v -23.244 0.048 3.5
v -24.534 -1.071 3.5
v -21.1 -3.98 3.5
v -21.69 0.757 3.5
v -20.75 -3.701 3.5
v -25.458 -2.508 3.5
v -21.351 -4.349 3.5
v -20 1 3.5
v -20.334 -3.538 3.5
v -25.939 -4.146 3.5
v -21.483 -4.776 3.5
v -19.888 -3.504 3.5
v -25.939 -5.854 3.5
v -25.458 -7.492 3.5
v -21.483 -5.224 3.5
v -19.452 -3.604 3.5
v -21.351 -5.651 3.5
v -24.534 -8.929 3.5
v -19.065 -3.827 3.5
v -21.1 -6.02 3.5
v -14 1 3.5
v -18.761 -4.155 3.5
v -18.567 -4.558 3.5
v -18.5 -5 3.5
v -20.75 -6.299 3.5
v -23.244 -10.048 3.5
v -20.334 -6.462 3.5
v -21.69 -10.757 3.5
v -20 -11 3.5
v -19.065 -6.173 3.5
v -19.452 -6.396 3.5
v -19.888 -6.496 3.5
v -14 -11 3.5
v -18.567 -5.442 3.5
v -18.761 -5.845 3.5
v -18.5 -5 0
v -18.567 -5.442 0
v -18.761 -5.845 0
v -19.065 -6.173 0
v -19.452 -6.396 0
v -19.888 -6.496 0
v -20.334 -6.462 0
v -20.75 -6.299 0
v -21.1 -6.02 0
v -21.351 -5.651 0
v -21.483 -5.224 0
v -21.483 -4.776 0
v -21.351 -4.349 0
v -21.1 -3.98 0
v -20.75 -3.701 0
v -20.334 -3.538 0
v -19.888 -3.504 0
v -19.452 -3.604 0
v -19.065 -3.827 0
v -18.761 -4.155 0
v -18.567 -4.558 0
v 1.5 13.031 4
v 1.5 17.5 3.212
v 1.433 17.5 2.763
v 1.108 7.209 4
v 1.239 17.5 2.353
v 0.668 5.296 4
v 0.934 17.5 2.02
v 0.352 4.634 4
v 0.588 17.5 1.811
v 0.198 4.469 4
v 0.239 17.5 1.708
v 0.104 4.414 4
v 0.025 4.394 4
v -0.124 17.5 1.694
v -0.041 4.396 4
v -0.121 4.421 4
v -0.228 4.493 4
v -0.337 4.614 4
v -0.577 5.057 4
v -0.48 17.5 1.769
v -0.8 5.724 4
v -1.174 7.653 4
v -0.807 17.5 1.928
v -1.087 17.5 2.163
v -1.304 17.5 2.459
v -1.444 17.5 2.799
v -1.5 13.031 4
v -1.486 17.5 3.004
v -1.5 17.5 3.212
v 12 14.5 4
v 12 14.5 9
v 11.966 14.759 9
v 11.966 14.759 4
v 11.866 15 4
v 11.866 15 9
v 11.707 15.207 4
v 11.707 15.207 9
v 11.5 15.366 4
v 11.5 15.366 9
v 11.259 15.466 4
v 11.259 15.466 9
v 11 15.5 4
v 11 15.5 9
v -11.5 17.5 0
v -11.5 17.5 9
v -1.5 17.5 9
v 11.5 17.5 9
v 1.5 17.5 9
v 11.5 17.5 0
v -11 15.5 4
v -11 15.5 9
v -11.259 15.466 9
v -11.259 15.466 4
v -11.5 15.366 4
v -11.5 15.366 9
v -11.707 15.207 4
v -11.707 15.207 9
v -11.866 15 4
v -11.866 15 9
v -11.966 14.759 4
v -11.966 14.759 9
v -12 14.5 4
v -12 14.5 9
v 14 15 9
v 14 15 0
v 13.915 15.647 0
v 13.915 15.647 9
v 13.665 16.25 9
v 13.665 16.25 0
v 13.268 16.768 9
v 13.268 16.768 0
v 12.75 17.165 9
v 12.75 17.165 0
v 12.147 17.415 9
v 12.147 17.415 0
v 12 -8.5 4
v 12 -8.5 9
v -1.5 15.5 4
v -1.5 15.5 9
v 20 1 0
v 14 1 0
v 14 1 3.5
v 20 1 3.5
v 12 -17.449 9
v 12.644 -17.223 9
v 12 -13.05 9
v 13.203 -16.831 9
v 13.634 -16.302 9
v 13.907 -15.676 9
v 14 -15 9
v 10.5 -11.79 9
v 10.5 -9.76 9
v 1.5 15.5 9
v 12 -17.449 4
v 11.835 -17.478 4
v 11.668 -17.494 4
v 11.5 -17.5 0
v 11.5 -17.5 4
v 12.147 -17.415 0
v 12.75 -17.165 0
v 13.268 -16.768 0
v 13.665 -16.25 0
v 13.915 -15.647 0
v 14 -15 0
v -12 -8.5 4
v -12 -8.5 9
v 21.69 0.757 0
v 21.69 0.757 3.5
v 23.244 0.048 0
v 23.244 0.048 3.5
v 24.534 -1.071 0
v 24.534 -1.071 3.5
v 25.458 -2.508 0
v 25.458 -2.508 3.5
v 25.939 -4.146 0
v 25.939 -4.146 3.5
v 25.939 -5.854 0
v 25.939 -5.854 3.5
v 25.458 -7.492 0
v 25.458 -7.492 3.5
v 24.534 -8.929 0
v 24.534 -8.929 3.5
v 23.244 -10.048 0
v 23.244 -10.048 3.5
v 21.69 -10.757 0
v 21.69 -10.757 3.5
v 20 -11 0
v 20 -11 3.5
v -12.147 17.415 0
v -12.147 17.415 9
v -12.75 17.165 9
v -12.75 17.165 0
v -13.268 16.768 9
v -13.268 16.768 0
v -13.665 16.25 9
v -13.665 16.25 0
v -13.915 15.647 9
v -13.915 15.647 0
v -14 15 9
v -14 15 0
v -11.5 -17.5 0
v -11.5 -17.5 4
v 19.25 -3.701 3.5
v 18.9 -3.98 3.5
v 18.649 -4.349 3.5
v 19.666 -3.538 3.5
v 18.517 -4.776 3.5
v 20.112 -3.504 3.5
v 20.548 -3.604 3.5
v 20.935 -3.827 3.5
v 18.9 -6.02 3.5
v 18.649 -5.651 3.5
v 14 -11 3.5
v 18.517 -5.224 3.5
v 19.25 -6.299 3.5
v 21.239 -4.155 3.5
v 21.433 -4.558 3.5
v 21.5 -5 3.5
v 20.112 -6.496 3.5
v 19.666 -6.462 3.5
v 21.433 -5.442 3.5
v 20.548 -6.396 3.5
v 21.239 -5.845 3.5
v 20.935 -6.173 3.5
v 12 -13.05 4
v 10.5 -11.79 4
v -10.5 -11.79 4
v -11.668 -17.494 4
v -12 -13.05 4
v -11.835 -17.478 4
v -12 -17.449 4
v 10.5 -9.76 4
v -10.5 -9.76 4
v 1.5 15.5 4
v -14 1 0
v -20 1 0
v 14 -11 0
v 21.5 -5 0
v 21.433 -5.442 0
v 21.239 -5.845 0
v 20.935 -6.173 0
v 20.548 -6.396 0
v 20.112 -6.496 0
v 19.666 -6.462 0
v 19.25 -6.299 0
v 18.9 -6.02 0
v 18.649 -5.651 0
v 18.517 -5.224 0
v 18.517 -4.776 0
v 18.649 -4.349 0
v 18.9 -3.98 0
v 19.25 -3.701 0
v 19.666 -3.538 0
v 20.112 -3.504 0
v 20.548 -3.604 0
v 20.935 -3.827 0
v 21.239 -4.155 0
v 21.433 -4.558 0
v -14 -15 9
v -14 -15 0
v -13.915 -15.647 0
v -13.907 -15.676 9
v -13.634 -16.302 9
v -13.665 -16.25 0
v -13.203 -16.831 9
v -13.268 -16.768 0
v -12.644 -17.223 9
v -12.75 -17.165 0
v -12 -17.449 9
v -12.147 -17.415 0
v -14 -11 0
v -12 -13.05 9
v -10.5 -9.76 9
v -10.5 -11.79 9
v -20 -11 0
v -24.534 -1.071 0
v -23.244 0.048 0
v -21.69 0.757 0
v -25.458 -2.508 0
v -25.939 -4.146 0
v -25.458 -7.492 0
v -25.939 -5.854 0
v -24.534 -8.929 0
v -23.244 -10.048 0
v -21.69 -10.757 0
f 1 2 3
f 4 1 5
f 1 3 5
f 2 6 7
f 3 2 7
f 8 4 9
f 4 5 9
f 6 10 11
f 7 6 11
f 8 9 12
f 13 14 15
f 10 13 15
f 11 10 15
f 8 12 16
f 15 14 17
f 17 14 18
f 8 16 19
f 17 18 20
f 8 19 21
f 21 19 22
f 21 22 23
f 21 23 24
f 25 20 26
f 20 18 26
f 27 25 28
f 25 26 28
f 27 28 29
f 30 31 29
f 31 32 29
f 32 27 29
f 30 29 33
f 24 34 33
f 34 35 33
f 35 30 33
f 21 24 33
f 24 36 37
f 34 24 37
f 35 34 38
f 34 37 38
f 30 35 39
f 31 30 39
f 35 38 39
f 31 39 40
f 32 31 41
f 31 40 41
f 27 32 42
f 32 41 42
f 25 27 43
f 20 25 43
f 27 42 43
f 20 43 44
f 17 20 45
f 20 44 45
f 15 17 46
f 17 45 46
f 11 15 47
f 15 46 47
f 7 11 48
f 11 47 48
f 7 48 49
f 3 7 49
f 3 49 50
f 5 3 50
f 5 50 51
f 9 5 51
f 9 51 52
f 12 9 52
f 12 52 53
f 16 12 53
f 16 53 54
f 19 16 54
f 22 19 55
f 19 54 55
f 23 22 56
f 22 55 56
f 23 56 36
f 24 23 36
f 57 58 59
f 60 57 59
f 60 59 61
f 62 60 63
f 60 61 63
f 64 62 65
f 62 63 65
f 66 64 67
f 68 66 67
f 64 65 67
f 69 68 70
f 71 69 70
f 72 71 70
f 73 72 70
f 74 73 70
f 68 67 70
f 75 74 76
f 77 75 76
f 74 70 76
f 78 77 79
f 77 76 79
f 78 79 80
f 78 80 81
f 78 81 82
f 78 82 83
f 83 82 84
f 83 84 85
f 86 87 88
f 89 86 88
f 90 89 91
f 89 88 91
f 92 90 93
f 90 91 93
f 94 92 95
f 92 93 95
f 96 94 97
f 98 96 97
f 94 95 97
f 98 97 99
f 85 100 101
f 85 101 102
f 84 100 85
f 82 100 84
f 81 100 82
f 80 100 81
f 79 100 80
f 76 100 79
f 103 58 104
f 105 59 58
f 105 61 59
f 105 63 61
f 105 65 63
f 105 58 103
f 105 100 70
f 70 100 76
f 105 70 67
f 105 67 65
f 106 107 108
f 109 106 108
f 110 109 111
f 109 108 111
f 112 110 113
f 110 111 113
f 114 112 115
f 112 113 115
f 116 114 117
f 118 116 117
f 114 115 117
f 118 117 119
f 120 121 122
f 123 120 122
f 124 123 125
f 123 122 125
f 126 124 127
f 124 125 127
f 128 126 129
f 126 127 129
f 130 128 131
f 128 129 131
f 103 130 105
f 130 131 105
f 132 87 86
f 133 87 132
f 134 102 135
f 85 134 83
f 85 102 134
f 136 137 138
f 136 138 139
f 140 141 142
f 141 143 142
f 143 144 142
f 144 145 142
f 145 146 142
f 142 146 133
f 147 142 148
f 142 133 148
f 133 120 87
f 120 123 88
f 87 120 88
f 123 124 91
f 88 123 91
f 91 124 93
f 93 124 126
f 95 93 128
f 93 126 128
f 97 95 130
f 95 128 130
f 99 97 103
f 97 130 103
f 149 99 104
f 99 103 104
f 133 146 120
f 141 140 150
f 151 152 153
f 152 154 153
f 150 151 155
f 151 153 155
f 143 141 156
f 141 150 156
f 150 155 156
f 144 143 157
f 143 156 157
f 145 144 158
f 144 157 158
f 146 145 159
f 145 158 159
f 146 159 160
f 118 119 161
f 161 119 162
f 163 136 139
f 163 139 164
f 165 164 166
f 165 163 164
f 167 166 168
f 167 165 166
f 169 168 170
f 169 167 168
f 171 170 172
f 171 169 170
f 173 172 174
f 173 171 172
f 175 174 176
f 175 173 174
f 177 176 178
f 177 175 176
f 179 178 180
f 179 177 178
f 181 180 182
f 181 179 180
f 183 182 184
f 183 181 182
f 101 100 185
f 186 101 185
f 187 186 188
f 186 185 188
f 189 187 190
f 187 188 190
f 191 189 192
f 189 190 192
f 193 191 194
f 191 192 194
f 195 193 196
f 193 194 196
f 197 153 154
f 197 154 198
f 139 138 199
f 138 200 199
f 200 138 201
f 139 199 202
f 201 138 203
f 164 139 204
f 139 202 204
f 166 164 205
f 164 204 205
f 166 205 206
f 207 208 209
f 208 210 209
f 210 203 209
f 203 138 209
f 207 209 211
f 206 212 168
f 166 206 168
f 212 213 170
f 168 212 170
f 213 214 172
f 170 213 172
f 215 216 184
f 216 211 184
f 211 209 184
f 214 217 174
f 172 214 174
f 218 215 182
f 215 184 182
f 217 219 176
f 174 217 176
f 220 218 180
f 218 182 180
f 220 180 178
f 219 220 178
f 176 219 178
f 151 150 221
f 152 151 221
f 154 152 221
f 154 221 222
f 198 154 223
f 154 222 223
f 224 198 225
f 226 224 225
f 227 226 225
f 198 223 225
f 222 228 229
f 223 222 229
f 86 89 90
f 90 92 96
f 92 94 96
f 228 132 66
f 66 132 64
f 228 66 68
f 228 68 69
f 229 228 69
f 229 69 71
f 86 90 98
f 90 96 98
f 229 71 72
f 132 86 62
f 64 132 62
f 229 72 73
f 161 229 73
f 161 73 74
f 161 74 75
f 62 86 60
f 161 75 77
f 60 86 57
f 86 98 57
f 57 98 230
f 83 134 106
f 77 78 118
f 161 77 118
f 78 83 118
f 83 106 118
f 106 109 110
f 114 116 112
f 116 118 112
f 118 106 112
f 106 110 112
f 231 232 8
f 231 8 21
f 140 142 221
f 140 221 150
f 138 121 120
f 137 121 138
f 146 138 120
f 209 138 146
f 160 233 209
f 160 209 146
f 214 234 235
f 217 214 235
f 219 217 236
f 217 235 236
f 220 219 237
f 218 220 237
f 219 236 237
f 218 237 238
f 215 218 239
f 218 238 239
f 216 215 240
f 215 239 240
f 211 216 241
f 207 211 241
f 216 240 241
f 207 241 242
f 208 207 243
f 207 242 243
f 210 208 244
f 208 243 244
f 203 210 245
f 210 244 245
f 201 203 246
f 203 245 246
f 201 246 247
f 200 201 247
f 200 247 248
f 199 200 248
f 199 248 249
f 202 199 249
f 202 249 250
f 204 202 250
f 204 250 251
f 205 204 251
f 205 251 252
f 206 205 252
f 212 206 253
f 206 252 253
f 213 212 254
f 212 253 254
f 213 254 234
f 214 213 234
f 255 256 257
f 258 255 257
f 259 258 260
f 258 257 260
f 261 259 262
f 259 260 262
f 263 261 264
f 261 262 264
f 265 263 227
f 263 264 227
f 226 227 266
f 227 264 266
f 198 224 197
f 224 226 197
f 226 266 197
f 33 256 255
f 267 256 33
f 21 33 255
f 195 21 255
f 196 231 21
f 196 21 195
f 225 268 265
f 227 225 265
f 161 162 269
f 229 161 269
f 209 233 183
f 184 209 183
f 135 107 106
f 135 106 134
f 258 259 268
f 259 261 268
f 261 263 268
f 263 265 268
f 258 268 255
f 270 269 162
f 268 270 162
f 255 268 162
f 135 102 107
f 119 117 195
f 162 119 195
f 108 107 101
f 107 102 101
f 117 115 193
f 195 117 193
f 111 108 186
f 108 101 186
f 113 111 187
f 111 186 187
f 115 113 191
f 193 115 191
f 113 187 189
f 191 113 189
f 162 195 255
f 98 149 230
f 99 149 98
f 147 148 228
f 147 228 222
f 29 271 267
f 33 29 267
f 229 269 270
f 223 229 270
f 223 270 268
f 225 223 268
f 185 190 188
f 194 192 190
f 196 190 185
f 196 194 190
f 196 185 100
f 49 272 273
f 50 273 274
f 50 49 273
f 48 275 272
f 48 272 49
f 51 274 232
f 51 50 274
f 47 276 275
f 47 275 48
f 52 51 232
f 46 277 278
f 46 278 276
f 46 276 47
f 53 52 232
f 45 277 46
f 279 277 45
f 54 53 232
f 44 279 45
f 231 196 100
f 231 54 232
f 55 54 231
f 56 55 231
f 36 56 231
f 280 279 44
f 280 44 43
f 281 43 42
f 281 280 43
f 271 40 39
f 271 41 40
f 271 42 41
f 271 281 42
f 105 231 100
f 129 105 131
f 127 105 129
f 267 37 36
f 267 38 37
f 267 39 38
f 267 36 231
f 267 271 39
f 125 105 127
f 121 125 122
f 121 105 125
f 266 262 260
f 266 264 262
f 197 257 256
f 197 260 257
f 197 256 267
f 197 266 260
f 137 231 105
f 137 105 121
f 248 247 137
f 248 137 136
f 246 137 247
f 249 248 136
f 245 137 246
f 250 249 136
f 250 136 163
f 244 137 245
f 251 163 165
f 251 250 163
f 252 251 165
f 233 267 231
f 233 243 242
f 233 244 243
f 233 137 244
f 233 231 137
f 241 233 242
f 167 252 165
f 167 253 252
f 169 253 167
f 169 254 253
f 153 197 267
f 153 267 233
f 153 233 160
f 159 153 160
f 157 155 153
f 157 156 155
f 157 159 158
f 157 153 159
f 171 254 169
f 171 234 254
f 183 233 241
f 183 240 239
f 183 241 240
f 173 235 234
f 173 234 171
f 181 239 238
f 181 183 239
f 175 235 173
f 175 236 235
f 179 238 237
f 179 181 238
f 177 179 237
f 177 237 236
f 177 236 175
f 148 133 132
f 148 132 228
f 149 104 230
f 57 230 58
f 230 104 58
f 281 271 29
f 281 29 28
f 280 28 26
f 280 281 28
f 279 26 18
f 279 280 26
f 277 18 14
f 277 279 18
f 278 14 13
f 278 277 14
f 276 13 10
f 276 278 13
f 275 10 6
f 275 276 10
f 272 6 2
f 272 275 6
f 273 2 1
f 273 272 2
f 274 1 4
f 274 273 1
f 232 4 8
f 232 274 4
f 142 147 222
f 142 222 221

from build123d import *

# Parameters (mm, degrees)
PAD_DEPTH       = 9
POCKET_DEPTH    = 5
POCKET001_DEPTH = 20
SKETCH003_R     = 1.5
PAD001_DEPTH    = 3.5


with BuildPart() as part:
    # Sketch → Pad (new body)
    with BuildSketch(Plane.XY):
        with BuildLine():
            Line((-11.5, 17.5), (11.5, 17.5))
            ThreePointArc((14, 15), (13.267767, 16.767767), (11.5, 17.5))
            Line((14, 15), (14, -15))
            ThreePointArc((11.5, -17.5), (13.267767, -16.767767), (14, -15))
            Line((11.5, -17.5), (-11.5, -17.5))
            ThreePointArc((-14, -15), (-13.267767, -16.767767), (-11.5, -17.5))
            Line((-14, -15), (-14, 15))
            ThreePointArc((-11.5, 17.5), (-13.267767, 16.767767), (-14, 15))
        make_face()
    extrude(amount=PAD_DEPTH)

    # Sketch001 (on Face10 of Pad) → Pocket (cut)
    with BuildSketch(Plane.XY.offset(9)):
        with BuildLine():
            Line((-11, 15.5), (11, 15.5))
            ThreePointArc((12, 14.5), (11.707107, 15.207107), (11, 15.5))
            Line((12, 14.5), (12, -8.5))
            Line((12, -8.5), (10.5, -9.76))
            Line((10.5, -9.76), (10.5, -11.79))
            Line((10.5, -11.79), (12, -13.05))
            Line((12, -13.05), (12, -18.05))
            Line((-12, -18.05), (12, -18.05))
            Line((-12, -13.05), (-12, -18.05))
            Line((-10.5, -11.79), (-12, -13.05))
            Line((-10.5, -9.76), (-10.5, -11.79))
            Line((-12, -8.5), (-10.5, -9.76))
            Line((-12, 14.5), (-12, -8.5))
            ThreePointArc((-11, 15.5), (-11.707107, 15.207107), (-12, 14.5))
        make_face()
    extrude(amount=-POCKET_DEPTH, mode=Mode.SUBTRACT)

    # Sketch002 (on Face9 of Pocket) → Pocket001 (cut)
    with BuildSketch(Plane(origin=(0, 17.5, 0), x_dir=(-1, 0, 0), z_dir=(0, 0.984808, -0.173648))):
        with BuildLine():
            ThreePointArc((-1.5, 3.16327), (0, 1.66327), (1.5, 3.16327))
            Line((1.5, 8.86327), (1.5, 3.16327))
            Line((-1.5, 8.86327), (1.5, 8.86327))
            Line((-1.5, 8.86327), (-1.5, 3.16327))
        make_face()
    extrude(amount=-POCKET001_DEPTH, mode=Mode.SUBTRACT)

    # Sketch003 (on Face4 of Pocket001) → Pad001 (join)
    with BuildSketch(Plane(origin=(0, 0, 0), x_dir=(1, 0, 0), z_dir=(0, 0, -1))):
        with BuildLine():
            ThreePointArc((-20, 11), (-26, 5), (-20, -1))
            Line((-20, -1), (20, -1))
            ThreePointArc((20, -1), (26, 5), (20, 11))
            Line((-20, 11), (20, 11))
        make_face()
        with Locations((-20, 5)):
            Circle(SKETCH003_R, mode=Mode.SUBTRACT)
        with Locations((20, 5)):
            Circle(SKETCH003_R, mode=Mode.SUBTRACT)
    extrude(amount=-PAD001_DEPTH)


solid = part.part
